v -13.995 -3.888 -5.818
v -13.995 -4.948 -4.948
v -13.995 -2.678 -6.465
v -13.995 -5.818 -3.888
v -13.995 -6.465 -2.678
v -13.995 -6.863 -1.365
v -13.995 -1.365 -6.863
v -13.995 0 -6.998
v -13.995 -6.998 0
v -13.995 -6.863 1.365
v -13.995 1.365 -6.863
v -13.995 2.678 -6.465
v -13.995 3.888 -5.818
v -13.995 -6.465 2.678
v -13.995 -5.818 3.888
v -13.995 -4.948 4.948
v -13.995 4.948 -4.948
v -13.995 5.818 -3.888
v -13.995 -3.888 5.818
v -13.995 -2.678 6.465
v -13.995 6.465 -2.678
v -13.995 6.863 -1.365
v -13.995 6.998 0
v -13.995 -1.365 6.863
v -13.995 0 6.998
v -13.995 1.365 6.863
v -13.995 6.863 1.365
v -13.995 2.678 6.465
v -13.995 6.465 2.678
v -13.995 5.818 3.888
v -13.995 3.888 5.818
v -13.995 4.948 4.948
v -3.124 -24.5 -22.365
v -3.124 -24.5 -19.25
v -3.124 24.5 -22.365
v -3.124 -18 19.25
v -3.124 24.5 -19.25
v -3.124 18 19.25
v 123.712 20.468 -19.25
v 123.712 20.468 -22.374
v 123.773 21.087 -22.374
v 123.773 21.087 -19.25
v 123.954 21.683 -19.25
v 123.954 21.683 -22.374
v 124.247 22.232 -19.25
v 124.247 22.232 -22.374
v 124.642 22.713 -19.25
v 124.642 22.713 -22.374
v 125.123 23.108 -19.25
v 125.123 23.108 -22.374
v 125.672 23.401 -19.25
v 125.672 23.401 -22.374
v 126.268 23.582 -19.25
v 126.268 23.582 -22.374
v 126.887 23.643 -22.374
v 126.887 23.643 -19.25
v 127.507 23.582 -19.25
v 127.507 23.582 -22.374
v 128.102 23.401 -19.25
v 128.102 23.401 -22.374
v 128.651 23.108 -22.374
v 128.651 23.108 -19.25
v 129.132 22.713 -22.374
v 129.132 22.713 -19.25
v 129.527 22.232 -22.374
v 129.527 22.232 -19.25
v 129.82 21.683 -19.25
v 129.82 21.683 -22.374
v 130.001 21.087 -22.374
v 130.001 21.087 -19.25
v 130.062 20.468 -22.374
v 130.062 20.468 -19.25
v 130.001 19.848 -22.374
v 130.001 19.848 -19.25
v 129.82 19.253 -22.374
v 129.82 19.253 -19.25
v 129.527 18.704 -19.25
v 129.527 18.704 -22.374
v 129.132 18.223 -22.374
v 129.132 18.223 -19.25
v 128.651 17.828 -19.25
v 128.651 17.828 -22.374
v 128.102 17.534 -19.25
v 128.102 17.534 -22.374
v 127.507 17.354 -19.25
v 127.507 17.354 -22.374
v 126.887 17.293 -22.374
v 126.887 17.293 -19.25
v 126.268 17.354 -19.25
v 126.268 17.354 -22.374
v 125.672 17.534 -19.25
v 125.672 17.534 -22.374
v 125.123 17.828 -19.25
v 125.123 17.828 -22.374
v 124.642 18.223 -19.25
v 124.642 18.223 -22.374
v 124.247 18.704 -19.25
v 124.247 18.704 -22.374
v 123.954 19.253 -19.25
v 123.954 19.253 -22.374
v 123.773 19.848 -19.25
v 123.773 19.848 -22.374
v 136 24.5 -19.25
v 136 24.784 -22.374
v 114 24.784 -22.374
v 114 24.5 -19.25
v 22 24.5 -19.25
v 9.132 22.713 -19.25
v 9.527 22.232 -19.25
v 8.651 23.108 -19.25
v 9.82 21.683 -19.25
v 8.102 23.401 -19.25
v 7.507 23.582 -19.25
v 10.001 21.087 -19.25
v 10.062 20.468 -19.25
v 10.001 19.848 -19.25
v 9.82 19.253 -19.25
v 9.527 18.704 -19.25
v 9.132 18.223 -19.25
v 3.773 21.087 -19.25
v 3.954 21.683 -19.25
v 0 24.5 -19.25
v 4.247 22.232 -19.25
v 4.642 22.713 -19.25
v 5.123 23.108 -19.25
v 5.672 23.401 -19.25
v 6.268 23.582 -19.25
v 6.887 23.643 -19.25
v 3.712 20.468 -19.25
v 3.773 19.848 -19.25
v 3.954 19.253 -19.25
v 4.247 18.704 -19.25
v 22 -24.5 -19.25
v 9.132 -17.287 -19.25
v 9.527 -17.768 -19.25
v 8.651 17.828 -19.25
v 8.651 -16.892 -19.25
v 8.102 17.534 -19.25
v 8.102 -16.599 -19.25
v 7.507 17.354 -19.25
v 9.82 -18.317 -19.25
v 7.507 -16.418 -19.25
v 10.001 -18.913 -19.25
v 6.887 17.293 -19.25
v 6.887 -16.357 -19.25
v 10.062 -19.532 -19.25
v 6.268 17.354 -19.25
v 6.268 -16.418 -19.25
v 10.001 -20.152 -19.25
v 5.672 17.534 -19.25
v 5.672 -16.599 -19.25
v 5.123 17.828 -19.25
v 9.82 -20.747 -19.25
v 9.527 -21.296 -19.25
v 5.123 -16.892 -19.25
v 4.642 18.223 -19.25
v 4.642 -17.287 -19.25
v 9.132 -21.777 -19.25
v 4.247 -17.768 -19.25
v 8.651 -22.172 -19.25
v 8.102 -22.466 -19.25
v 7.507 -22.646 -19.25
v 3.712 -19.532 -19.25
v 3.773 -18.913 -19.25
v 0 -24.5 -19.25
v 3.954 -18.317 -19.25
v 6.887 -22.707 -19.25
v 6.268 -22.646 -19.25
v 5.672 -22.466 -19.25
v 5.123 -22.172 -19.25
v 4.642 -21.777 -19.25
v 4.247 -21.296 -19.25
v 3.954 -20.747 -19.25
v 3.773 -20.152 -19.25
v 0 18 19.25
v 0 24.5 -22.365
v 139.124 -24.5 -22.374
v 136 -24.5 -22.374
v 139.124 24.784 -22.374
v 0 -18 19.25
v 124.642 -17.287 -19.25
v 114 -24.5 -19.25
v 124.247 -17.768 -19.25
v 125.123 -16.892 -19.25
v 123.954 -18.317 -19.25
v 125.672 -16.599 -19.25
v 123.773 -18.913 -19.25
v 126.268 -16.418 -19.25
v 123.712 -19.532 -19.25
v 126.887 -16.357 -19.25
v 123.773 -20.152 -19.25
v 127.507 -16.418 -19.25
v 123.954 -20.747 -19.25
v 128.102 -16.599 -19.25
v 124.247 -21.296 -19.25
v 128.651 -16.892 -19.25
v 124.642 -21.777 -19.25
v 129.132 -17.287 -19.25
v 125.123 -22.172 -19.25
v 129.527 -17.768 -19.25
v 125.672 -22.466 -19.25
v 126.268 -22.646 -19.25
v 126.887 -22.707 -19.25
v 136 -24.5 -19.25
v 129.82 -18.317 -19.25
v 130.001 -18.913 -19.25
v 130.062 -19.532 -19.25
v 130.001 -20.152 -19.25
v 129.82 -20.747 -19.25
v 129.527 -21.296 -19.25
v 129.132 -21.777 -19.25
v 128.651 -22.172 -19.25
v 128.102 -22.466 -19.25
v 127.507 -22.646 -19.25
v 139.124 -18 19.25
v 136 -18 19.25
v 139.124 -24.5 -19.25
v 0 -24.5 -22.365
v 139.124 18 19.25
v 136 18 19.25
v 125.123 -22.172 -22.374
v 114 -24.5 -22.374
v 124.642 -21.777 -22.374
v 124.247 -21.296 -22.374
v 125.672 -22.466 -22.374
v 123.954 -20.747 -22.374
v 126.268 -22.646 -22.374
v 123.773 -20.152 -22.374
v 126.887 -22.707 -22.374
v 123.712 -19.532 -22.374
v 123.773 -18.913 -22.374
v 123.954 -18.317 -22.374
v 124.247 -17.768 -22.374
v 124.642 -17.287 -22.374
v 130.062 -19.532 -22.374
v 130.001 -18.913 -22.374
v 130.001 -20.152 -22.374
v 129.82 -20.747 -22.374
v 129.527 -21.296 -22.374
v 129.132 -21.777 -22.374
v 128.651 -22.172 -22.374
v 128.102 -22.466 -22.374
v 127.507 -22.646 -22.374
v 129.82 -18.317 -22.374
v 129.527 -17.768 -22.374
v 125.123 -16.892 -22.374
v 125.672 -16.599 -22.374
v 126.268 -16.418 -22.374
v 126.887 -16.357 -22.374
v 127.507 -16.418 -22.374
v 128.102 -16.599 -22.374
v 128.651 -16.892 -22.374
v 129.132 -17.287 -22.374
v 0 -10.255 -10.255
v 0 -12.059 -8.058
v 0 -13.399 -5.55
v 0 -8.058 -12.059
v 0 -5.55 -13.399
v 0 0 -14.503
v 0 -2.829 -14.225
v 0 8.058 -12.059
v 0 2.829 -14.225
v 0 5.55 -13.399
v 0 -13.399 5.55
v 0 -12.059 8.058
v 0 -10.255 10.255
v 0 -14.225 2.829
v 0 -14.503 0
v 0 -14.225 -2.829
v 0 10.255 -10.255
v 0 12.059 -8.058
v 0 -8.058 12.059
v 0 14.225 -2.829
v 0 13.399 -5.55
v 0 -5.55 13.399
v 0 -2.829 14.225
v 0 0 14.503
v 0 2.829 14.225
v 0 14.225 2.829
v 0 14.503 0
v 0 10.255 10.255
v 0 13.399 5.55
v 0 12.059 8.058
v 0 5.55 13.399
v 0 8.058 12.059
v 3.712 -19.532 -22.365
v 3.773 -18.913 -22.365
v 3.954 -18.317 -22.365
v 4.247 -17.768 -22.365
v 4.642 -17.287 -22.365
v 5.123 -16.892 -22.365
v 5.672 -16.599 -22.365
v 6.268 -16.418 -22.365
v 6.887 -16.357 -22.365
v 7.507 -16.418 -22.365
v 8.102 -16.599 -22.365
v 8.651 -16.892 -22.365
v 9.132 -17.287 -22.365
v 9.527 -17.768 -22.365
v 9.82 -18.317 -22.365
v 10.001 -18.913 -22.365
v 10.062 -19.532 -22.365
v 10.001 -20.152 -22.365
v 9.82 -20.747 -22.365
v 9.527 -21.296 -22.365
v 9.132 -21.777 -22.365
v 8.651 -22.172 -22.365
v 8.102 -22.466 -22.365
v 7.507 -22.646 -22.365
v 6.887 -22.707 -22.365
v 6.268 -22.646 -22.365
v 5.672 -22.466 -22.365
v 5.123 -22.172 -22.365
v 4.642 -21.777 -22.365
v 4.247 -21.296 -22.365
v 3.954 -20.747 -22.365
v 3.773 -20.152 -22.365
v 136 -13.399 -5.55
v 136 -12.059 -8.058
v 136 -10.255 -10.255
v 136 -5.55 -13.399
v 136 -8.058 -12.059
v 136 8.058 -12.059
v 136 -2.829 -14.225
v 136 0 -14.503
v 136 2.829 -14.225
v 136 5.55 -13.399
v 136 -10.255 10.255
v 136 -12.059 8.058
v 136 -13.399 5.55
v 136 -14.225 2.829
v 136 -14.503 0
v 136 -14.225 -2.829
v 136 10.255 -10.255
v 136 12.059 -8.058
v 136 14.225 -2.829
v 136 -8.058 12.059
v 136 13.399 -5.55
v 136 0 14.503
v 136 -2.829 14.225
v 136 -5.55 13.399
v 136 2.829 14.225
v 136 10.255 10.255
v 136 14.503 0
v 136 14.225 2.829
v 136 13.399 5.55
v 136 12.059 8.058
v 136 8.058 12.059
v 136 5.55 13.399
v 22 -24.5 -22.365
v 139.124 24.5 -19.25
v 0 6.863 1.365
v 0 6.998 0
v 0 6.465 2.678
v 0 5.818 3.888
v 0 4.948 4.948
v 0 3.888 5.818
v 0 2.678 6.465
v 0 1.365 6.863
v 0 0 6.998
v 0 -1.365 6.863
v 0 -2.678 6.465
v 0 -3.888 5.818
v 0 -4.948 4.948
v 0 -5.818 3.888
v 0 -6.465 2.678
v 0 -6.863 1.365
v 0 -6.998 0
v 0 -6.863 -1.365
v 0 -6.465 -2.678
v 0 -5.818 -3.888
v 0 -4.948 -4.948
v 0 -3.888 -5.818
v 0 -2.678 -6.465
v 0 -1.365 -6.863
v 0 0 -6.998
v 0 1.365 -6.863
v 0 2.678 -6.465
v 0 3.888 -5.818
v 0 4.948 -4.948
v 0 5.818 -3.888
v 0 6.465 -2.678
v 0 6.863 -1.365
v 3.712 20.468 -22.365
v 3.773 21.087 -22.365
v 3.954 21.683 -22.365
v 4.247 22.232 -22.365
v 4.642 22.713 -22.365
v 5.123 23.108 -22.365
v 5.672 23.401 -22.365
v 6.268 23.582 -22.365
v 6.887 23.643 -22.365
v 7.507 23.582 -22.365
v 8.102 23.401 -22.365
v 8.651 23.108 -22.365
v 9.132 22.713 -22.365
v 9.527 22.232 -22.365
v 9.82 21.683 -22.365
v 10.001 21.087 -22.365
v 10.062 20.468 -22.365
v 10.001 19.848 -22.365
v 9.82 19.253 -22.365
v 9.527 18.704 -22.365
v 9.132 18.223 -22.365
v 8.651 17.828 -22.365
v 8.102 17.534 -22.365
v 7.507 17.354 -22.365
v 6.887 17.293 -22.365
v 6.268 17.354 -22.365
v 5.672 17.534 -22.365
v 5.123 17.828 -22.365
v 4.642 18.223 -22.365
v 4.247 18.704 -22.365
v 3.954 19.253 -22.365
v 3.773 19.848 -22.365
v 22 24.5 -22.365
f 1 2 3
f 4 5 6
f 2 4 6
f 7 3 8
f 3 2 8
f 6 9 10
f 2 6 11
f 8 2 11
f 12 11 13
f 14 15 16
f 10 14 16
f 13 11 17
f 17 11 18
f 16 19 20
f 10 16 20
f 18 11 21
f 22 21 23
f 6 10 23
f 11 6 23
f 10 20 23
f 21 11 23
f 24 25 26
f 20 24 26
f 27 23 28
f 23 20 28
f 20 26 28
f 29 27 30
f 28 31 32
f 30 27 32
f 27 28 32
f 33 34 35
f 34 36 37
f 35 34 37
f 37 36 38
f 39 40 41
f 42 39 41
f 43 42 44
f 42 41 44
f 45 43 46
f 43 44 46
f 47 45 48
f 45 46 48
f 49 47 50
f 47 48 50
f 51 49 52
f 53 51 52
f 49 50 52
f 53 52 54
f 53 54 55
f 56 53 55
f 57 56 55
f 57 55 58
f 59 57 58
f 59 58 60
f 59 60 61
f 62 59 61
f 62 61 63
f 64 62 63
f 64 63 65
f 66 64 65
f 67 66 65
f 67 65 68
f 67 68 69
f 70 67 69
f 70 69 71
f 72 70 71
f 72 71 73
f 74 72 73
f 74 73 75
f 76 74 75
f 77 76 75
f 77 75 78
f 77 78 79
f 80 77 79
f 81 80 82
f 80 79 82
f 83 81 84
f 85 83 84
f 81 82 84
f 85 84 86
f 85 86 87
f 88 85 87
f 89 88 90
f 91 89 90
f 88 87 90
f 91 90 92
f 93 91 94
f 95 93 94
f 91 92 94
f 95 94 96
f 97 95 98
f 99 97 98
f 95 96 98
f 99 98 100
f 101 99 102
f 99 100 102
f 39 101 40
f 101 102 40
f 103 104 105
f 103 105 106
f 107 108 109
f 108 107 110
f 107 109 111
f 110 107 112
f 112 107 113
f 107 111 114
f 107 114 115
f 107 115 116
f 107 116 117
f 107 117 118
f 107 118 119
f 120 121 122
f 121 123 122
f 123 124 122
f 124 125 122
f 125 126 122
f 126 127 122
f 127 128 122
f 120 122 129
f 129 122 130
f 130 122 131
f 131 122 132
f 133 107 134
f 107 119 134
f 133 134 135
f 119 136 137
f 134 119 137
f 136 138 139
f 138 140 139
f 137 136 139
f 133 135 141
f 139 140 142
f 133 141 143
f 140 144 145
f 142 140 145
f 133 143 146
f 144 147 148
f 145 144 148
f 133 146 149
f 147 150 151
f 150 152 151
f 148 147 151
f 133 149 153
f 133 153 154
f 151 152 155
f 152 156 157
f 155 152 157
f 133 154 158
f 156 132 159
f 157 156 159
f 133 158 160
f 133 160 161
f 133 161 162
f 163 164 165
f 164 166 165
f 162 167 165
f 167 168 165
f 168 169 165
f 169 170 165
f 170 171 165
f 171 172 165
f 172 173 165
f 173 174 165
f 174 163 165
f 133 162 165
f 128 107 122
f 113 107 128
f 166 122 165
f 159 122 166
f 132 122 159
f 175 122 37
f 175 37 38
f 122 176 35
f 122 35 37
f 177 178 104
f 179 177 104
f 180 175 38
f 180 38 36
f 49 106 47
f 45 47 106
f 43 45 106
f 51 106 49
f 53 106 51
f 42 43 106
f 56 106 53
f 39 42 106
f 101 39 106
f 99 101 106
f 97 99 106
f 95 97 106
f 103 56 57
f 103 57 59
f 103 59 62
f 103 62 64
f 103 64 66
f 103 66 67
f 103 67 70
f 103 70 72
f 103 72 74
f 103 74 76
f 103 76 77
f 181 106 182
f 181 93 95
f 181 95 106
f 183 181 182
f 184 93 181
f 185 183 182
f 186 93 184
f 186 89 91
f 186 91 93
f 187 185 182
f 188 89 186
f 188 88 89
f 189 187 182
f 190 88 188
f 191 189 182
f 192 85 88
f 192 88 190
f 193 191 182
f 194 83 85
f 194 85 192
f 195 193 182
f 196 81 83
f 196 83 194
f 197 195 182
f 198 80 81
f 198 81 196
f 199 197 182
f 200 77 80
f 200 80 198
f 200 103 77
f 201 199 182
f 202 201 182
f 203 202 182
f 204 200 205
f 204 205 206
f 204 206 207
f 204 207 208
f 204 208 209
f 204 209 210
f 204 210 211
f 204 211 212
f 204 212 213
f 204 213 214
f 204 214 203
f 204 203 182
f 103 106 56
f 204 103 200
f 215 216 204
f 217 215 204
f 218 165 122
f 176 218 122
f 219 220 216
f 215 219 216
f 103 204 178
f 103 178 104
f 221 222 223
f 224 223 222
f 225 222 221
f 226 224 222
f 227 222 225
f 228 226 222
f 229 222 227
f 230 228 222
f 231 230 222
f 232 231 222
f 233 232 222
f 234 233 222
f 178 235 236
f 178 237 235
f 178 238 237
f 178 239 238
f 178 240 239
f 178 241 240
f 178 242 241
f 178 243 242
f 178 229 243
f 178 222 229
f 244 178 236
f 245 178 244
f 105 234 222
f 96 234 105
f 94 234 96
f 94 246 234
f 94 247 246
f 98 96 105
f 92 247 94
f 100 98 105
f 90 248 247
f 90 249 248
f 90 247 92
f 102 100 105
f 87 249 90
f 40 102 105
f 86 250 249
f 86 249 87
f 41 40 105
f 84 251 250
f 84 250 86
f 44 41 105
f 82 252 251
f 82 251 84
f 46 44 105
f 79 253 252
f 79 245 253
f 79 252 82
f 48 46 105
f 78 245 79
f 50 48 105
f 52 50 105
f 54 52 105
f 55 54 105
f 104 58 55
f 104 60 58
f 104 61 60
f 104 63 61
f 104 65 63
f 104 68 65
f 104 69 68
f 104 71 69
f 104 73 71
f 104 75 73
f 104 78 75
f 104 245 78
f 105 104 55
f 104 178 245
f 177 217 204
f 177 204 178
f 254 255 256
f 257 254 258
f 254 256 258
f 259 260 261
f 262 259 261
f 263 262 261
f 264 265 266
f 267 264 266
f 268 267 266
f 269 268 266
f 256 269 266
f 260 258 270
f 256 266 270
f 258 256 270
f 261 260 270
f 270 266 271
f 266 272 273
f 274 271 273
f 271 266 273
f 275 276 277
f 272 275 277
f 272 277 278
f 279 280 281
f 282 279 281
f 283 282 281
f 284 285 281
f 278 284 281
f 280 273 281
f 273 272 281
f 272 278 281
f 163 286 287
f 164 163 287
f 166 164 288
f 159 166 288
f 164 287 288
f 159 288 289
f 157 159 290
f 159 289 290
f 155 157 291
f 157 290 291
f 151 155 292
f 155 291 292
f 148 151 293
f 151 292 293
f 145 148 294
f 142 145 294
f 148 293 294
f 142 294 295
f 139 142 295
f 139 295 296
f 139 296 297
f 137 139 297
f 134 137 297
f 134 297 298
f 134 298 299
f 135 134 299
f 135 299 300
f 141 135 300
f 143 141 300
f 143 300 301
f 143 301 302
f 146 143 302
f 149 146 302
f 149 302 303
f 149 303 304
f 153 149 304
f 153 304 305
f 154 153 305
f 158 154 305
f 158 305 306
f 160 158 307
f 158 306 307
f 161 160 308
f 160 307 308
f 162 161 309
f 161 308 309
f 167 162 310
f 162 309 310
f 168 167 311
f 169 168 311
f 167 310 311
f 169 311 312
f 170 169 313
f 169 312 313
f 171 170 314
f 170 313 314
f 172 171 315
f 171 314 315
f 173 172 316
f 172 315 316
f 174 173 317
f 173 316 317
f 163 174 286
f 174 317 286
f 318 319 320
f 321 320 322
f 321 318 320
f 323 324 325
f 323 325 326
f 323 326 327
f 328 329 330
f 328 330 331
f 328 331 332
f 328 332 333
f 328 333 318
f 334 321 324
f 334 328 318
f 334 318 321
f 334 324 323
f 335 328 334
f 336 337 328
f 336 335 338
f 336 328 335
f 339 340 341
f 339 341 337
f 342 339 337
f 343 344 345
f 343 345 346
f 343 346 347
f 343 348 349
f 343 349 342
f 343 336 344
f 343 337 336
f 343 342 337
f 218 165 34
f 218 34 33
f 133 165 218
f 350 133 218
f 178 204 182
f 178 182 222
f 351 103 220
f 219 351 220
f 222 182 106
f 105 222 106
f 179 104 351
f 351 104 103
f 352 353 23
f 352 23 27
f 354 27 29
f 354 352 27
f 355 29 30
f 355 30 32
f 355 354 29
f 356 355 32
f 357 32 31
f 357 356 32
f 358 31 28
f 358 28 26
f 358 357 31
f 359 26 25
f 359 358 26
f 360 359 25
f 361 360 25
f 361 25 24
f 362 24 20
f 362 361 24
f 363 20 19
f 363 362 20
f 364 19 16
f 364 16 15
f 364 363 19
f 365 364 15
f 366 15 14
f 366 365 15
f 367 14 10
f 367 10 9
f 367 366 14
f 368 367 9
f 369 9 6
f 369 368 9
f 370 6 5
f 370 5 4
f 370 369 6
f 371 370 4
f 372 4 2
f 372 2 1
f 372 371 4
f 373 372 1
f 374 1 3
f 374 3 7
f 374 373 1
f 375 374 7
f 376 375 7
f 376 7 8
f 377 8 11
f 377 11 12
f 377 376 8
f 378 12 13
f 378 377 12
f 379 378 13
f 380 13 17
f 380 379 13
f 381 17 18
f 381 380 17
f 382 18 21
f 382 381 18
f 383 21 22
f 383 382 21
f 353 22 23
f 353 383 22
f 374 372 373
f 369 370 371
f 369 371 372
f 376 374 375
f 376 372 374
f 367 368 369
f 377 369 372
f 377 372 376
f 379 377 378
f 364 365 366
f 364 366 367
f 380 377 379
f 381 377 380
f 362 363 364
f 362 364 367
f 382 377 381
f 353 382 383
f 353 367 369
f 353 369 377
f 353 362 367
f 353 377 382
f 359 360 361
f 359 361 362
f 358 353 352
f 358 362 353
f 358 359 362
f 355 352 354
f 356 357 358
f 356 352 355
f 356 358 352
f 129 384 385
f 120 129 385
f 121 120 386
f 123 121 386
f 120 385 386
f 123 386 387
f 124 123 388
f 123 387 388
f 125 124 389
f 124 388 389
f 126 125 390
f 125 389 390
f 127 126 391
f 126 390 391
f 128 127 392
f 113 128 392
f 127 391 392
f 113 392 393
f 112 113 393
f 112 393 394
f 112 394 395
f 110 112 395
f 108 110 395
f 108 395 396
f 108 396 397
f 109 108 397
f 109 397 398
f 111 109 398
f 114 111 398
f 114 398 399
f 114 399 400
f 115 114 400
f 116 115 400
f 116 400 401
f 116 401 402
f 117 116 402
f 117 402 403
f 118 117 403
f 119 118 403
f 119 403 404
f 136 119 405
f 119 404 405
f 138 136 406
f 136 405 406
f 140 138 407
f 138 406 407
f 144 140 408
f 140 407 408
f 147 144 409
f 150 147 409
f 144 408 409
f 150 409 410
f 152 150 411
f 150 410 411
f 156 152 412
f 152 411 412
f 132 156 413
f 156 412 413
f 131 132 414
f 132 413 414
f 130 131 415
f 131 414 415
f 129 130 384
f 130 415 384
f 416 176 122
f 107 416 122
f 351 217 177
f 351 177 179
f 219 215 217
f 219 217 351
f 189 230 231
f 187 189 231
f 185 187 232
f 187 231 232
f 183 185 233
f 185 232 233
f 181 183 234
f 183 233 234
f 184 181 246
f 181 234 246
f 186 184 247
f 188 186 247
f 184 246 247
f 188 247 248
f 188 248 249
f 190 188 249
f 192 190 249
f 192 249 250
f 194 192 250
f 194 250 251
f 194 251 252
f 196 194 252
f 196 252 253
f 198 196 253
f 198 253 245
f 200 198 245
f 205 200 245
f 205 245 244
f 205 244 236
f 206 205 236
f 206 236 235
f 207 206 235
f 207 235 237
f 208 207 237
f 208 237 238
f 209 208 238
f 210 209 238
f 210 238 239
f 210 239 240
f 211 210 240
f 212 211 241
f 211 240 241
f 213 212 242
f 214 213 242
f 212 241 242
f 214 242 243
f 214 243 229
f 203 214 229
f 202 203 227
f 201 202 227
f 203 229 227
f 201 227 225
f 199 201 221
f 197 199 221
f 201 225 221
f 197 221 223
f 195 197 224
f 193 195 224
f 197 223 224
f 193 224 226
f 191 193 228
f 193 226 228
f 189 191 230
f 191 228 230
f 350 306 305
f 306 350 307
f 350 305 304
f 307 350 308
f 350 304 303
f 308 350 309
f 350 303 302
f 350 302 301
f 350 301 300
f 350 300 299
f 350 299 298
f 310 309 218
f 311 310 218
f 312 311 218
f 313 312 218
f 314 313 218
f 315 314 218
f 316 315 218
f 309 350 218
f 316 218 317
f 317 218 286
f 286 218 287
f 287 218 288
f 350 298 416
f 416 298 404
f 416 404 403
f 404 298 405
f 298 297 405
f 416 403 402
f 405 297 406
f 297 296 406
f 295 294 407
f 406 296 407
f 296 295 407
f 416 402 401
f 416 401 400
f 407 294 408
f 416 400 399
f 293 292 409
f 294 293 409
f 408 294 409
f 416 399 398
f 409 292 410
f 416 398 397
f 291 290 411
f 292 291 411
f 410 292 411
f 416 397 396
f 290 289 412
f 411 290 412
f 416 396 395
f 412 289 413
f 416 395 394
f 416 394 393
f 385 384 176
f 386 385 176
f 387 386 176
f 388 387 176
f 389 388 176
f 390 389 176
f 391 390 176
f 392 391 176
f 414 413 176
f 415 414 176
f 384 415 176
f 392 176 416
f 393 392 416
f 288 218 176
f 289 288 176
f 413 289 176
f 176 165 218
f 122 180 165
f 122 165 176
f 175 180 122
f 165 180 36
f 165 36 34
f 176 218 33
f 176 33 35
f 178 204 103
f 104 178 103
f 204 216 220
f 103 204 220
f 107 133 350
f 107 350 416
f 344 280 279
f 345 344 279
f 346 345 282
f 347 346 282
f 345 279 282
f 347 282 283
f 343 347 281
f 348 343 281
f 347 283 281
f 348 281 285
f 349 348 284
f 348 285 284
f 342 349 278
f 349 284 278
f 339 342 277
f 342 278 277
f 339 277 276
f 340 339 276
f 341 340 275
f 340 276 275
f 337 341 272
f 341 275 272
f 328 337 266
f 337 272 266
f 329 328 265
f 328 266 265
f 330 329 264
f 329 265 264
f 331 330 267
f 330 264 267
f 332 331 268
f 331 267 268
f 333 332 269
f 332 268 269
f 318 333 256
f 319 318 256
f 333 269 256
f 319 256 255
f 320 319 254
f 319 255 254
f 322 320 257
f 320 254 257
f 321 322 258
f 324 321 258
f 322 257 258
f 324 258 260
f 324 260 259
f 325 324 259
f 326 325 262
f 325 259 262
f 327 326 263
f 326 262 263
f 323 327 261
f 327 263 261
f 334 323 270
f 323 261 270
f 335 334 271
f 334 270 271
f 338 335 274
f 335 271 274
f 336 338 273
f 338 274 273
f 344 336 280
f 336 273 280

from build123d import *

# Parameters (mm, degrees)
F0_R      = 14.5034
F1_DEPTH  = 136
F2_R      = 6.9977
F3_DEPTH  = 13.9954
F5_DEPTH  = 22
F8_DEPTH  = 22
F9_DEPTH  = 3.1242
F11_DEPTH = 3.1242
F13_D     = 6.35
F13_2_D   = 6.35


# Not quite as in the source:
# - a feature names something its author has since deleted; it is built from what else it names


with BuildPart() as f1:
    # F0 (on Right) → F1 (new body)
    with BuildSketch(Plane.YZ):
        Circle(F0_R)
    extrude(amount=F1_DEPTH)


with BuildPart() as f3:
    # F2 (on Right) → F3 (new body)
    with BuildSketch(Plane.YZ):
        Circle(F2_R)
    extrude(amount=-F3_DEPTH)


with BuildPart() as f5:
    # F4 (on Right) → F5 (new body)
    with BuildSketch(Plane.YZ):
        Polygon((24.5, -19.25), (0, -19.25), (-24.5, -19.25), (-24.5, -22.3650014941), (24.5, -22.3650014941), align=None)
    extrude(amount=F5_DEPTH)

    # F13 (through all)
    with Locations(Plane.XY.offset(-19.25)):
        with Locations((6.8870979548, -19.5322781801), (6.8870979548, 20.4677218199), (126.8870979548, 20.4677218199), (126.8870979548, -19.5322781801)):
            Hole(F13_D / 2)


with BuildPart() as f8:
    # F7 (on offset) → F8 (new body)
    with BuildSketch(Plane.YZ.offset(136)):
        Polygon((0, -19.25), (-24.5, -19.25), (-24.5, -22.3742), (24.7841487321, -22.3742), (24.5, -19.25), align=None)
    extrude(amount=-F8_DEPTH)

    # F13#2 (through all)
    with Locations(Plane.XY.offset(-19.25)):
        with Locations((6.8870979548, -19.5322781801), (6.8870979548, 20.4677218199), (126.8870979548, 20.4677218199), (126.8870979548, -19.5322781801)):
            Hole(F13_2_D / 2)


with BuildPart() as f9:
    # F7 (on offset) → F9 (new body)
    with BuildSketch(Plane.YZ.offset(136)):
        Polygon((0, 19.25), (-18, 19.25), (-24.5, -19.25), (0, -19.25), align=None)
        Polygon((18, 19.25), (0, 19.25), (0, -19.25), (24.5, -19.25), align=None)
        Polygon((0, -19.25), (-24.5, -19.25), (-24.5, -22.3742), (24.7841487321, -22.3742), (24.5, -19.25), align=None)
    extrude(amount=F9_DEPTH)


with BuildPart() as f11:
    # F4 (on Right) → F11 (new body)
    with BuildSketch(Plane.YZ):
        Polygon((18, 19.25), (0, 19.25), (0, -19.25), (24.5, -19.25), align=None)
        Polygon((0, -19.25), (0, 19.25), (-18, 19.25), (-24.5, -19.25), align=None)
        Polygon((24.5, -19.25), (0, -19.25), (-24.5, -19.25), (-24.5, -22.3650014941), (24.5, -22.3650014941), align=None)
    extrude(amount=-F11_DEPTH)


solid = Compound([f1.part, f3.part, f5.part, f8.part, f9.part, f11.part])
